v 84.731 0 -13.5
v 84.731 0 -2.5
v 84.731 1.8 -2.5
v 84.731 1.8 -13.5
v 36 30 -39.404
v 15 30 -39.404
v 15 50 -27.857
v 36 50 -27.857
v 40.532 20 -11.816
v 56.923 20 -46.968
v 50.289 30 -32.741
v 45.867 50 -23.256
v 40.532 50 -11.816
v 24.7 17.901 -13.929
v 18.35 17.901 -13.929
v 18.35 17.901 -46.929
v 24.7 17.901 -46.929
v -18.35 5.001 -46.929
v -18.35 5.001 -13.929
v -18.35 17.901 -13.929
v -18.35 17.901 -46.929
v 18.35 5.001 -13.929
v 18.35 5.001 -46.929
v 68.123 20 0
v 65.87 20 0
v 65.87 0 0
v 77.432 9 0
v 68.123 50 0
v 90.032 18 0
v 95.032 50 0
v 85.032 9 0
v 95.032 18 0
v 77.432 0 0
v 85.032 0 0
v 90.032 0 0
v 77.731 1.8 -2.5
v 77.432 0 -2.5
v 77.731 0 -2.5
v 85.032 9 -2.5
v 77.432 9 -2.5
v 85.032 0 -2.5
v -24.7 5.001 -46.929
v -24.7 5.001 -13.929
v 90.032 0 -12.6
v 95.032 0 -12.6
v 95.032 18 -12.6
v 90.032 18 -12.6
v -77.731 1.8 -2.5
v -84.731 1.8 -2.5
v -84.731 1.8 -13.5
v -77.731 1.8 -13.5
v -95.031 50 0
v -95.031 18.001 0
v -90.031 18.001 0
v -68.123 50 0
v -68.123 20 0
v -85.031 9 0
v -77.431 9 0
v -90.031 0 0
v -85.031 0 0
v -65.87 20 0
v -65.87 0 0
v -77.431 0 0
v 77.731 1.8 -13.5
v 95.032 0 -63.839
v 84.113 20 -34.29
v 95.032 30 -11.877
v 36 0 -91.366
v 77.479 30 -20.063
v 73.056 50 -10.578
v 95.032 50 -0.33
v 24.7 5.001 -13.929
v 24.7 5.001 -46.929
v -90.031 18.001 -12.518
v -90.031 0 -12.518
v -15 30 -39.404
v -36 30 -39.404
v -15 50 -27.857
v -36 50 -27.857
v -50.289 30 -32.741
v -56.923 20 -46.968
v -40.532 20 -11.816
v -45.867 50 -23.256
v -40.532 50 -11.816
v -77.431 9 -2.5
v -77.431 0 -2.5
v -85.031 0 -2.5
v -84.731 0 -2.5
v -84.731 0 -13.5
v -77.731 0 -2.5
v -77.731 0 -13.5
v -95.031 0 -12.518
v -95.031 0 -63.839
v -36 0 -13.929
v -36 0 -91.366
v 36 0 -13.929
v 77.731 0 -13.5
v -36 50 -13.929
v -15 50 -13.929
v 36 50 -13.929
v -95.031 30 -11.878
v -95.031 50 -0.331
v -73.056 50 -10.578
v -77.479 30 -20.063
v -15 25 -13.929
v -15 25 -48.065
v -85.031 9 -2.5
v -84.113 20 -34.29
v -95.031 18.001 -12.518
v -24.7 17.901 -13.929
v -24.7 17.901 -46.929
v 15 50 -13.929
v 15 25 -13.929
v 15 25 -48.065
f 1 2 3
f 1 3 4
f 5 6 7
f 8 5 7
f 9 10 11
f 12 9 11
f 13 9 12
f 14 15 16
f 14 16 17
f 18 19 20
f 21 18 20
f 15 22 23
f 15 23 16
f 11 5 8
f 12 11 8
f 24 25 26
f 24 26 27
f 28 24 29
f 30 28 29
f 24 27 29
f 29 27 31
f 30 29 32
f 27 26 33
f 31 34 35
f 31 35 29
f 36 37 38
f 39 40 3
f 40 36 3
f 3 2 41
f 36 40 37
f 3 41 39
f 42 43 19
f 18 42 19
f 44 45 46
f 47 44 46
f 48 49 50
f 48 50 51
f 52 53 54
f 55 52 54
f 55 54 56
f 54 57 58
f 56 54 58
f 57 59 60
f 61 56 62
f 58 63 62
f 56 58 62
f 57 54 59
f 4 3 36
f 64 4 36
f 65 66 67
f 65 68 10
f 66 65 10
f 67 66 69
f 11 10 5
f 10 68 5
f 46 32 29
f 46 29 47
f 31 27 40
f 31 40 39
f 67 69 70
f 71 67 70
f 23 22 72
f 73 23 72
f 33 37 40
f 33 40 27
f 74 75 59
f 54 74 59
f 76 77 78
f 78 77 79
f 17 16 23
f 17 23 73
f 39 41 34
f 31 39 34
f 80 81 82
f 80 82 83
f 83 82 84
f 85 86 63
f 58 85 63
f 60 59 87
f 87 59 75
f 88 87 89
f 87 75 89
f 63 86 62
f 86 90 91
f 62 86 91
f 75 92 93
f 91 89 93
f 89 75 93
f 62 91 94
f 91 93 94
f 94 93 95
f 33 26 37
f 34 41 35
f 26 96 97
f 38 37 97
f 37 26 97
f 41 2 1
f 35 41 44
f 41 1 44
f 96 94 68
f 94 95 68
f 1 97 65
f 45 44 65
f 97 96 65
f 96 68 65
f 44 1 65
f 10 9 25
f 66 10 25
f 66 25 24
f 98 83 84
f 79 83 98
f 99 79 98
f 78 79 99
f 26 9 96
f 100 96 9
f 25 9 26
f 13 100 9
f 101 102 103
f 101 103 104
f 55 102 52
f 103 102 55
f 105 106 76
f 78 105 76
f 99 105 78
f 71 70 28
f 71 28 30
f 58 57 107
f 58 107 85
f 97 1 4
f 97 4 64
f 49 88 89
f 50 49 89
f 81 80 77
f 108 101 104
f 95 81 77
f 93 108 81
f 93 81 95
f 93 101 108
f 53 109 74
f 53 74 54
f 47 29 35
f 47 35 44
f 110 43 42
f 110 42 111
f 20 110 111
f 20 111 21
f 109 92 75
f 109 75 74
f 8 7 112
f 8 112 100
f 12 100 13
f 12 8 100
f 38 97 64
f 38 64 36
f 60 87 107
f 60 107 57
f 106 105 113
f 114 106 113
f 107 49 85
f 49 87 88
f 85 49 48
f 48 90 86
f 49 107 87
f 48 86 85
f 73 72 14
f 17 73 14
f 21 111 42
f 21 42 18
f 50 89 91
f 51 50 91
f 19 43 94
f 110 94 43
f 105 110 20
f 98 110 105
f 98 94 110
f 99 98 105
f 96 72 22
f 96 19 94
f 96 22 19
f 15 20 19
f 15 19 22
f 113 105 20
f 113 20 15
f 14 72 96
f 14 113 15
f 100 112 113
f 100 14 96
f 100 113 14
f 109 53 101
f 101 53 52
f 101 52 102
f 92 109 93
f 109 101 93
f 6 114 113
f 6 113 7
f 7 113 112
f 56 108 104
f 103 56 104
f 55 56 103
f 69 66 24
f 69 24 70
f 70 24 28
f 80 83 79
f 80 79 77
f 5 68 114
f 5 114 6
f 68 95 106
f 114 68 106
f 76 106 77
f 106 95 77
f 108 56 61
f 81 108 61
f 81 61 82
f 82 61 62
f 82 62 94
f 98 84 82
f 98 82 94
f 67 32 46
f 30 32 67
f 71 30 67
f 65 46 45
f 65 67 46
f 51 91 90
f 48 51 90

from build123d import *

# Parameters (mm, degrees)
SALIENTE_EXTRUIR1_DEPTH            = 50
CORTAR_EXTRUIR1_DEPTH              = 72
CORTAR_EXTRUIR4_REACH              = 144.211
CROQUIS6_W                         = 30
CROQUIS6_H                         = 25
CORTAR_EXTRUIR5_REACH              = 144.211
CROQUIS8_W                         = 30
CROQUIS8_H                         = 30
CORTAR_EXTRUIR6_DEPTH              = 40
CROQUIS9_W                         = 30
CROQUIS9_H                         = 30
CORTAR_EXTRUIR7_DEPTH              = 40
CROQUIS10_W                        = 6.35
CROQUIS10_H                        = 12.9
CORTAR_EXTRUIR8_DEPTH              = 33
CORTAR_EXTRUIR9_REACH              = 144.211
CORTAR_EXTRUIR10_REACH             = 144.211
CORTAR_EXTRUIR10_DIRECTION_2_DEPTH = 143.210791725
CROQUIS14_W                        = 12.6
CROQUIS14_H                        = 18
CORTAR_EXTRUIR11_DEPTH             = 5
CROQUIS15_W                        = 12.517773713
CROQUIS15_H                        = 18.001366708
CORTAR_EXTRUIR12_DEPTH             = 5
CROQUIS16_W                        = 7.6
CROQUIS16_H                        = 2.5
CORTAR_EXTRUIR13_DEPTH             = 9
CORTAR_EXTRUIR14_DEPTH             = 1.8


with BuildPart() as part:
    # Croquis1 → Saliente-Extruir1 (new body)
    with BuildSketch(Plane(origin=(0, 0, 0), x_dir=(1, 0, 0), z_dir=(0, 1, 0))):
        Polygon((-96.830741331, 0), (96.830741331, 0), (96.830741331, 63), (36, 91.365840534), (-36, 91.365840534), (-96.830741331, 63), align=None)
    extrude(amount=SALIENTE_EXTRUIR1_DEPTH)

    # Croquis3D2 → Cortar-Extruir1 (cut)
    with BuildSketch(Plane(origin=(-36, 0, -91.365840534), x_dir=(0, 0.6600783810393928, 0.751196732477195), z_dir=(-1, 0, 0))):
        Polygon((0, 0), (58.835678645, -11.762776814), (93.598994681, 0), (40.781406688, 46.410941988), align=None)
    extrude(amount=-CORTAR_EXTRUIR1_DEPTH, mode=Mode.SUBTRACT)

    # Cortar-Barrer1: sweep along a curve in space
    with BuildLine() as cortar_barrer1_path:
        Line((96.830741331, 50, -63), (36, 50, -91.365840534))
    # Croquis2 → Cortar-Barrer1 (sweep, cut)
    with BuildSketch(Plane.ZY.offset(-36)):
        Polygon((-91.365840534, 50), (-27.857310923, 50), (-39.404316307, 30), (-91.365840534, 0), align=None)
    sweep(path=cortar_barrer1_path.line, mode=Mode.SUBTRACT)

    # Cortar-Barrer2: sweep along a curve in space
    with BuildLine() as cortar_barrer2_path:
        Line((-36, 50, -91.365840534), (-96.830741331, 50, -63))
    # Croquis3 → Cortar-Barrer2 (sweep, cut)
    with BuildSketch(Plane(origin=(-36, 0, 0), x_dir=(0, 0, -1), z_dir=(1, 0, 0))):
        Polygon((27.857310923, 50), (91.365840534, 50), (91.365840534, 0), (39.404316307, 30), align=None)
    sweep(path=cortar_barrer2_path.line, mode=Mode.SUBTRACT)

    # Croquis6 → Cortar-Extruir4 (cut, up to next)
    with BuildSketch(Plane.XY, mode=Mode.PRIVATE) as cortar_extruir4_sk1:
        with Locations((0, 37.5)):
            Rectangle(CROQUIS6_W, CROQUIS6_H)
    cortar_extruir4_tool1 = extrude(cortar_extruir4_sk1.sketch, amount=-CORTAR_EXTRUIR4_REACH, mode=Mode.PRIVATE) & part.part
    add(cortar_extruir4_tool1.solids().sort_by_distance((0, 37.5, 0))[0], mode=Mode.SUBTRACT)

    # Croquis7 → Cortar-Extruir5 (cut, up to next)
    with BuildSketch(Plane(origin=(0, 50, 0), x_dir=(1, 0, 0), z_dir=(0, 1, 0)), mode=Mode.PRIVATE) as cortar_extruir5_sk1:
        Polygon((-36, 13.928655461), (36, 13.928655461), (65.87009803, 0), (-65.87009803, 0), align=None)
    cortar_extruir5_tool1 = extrude(cortar_extruir5_sk1.sketch, amount=-CORTAR_EXTRUIR5_REACH, mode=Mode.PRIVATE) & part.part
    add(cortar_extruir5_tool1.solids().sort_by_distance((0, 50, -6.28364))[0], mode=Mode.SUBTRACT)

    # Croquis8 → Cortar-Extruir6 (cut)
    with BuildSketch(Plane(origin=(-11.764807584, 0, -25.229711282), x_dir=(0.9063077870366527, 0, -0.4226182617406937), z_dir=(0.4226182617406937, 0, 0.9063077870366527))):
        with Locations((-46.740576174, 35)):
            Rectangle(CROQUIS8_W, CROQUIS8_H)
    extrude(amount=-CORTAR_EXTRUIR6_DEPTH, mode=Mode.SUBTRACT)

    # Croquis9 → Cortar-Extruir7 (cut)
    with BuildSketch(Plane(origin=(11.764807584, 0, -25.229711282), x_dir=(0.9063077870366495, 0, 0.42261826174070066), z_dir=(-0.42261826174070066, 0, 0.9063077870366495))):
        with Locations((46.740576174, 35)):
            Rectangle(CROQUIS9_W, CROQUIS9_H)
    extrude(amount=-CORTAR_EXTRUIR7_DEPTH, mode=Mode.SUBTRACT)

    # Croquis10 → Cortar-Extruir8 (cut)
    with BuildSketch(Plane.XY.offset(-13.928655461)):
        with Locations((-21.525, 11.451366708)):
            Rectangle(CROQUIS10_W, CROQUIS10_H)
        with Locations((21.525, 11.451366708)):
            Rectangle(CROQUIS10_W, CROQUIS10_H)
    extrude(amount=-CORTAR_EXTRUIR8_DEPTH, mode=Mode.SUBTRACT)

    # Croquis12 → Cortar-Extruir9 (cut, up to next)
    with BuildSketch(Plane(origin=(0, 50, 0), x_dir=(1, 0, 0), z_dir=(0, 1, 0)), mode=Mode.PRIVATE) as cortar_extruir9_sk1:
        Polygon((-96.830741331, 0), (-95.030741331, 0), (-95.030741331, 63.839353785), (-96.830741331, 63), align=None)
    cortar_extruir9_tool1 = extrude(cortar_extruir9_sk1.sketch, amount=-CORTAR_EXTRUIR9_REACH, mode=Mode.PRIVATE) & part.part
    add(cortar_extruir9_tool1.solids().sort_by_distance((-95.928756, 50, -31.710301))[0], mode=Mode.SUBTRACT)

    # Croquis13 → Cortar-Extruir10 (cut, up to next)
    with BuildSketch(Plane(origin=(0, 50, 0), x_dir=(1, 0, 0), z_dir=(0, 1, 0)), mode=Mode.PRIVATE) as cortar_extruir10_sk1:
        Polygon((96.830741331, 0), (95.032124755, 0), (95.032124755, 63.838708683), (96.830741331, 63), align=None)
    cortar_extruir10_tool1 = extrude(cortar_extruir10_sk1.sketch, amount=-CORTAR_EXTRUIR10_REACH, mode=Mode.PRIVATE) & part.part
    add(cortar_extruir10_tool1.solids().sort_by_distance((95.929451, 50, -31.710139))[0], mode=Mode.SUBTRACT)

    # Croquis13 → Cortar-Extruir10 direction 2 (cut)
    with BuildSketch(Plane(origin=(0, 50, 0), x_dir=(1, 0, 0), z_dir=(0, 1, 0))):
        Polygon((96.830741331, 0), (95.032124755, 0), (95.032124755, 63.838708683), (96.830741331, 63), align=None)
    extrude(amount=CORTAR_EXTRUIR10_DIRECTION_2_DEPTH, mode=Mode.SUBTRACT)

    # Croquis14 → Cortar-Extruir11 (cut)
    with BuildSketch(Plane(origin=(95.032124755, 0, 0), x_dir=(0, 0, -1), z_dir=(1, 0, 0))):
        with Locations((6.3, 9)):
            Rectangle(CROQUIS14_W, CROQUIS14_H)
    extrude(amount=-CORTAR_EXTRUIR11_DEPTH, mode=Mode.SUBTRACT)

    # Croquis15 → Cortar-Extruir12 (cut)
    with BuildSketch(Plane.ZY.offset(95.030741331)):
        with Locations((-6.258886857, 9.000683354)):
            Rectangle(CROQUIS15_W, CROQUIS15_H)
    extrude(amount=-CORTAR_EXTRUIR12_DEPTH, mode=Mode.SUBTRACT)

    # Croquis16 → Cortar-Extruir13 (cut)
    with BuildSketch(Plane.XZ):
        with Locations((-81.230741331, -1.25)):
            Rectangle(CROQUIS16_W, CROQUIS16_H)
        with Locations((81.232124755, -1.25)):
            Rectangle(CROQUIS16_W, CROQUIS16_H)
    extrude(amount=-CORTAR_EXTRUIR13_DEPTH, mode=Mode.SUBTRACT)

    # Croquis17 → Cortar-Extruir14 (cut)
    with BuildSketch(Plane.XZ):
        Polygon((-81.230741331, -2.5), (-84.730741331, -2.5), (-84.730741331, -13.5), (-77.730741331, -13.5), (-77.730741331, -2.5), align=None)
        Polygon((77.730741331, -13.5), (77.730741331, -2.5), (81.230741331, -2.5), (84.730741331, -2.5), (84.730741331, -13.5), align=None)
    extrude(amount=-CORTAR_EXTRUIR14_DEPTH, mode=Mode.SUBTRACT)


solid = part.part
